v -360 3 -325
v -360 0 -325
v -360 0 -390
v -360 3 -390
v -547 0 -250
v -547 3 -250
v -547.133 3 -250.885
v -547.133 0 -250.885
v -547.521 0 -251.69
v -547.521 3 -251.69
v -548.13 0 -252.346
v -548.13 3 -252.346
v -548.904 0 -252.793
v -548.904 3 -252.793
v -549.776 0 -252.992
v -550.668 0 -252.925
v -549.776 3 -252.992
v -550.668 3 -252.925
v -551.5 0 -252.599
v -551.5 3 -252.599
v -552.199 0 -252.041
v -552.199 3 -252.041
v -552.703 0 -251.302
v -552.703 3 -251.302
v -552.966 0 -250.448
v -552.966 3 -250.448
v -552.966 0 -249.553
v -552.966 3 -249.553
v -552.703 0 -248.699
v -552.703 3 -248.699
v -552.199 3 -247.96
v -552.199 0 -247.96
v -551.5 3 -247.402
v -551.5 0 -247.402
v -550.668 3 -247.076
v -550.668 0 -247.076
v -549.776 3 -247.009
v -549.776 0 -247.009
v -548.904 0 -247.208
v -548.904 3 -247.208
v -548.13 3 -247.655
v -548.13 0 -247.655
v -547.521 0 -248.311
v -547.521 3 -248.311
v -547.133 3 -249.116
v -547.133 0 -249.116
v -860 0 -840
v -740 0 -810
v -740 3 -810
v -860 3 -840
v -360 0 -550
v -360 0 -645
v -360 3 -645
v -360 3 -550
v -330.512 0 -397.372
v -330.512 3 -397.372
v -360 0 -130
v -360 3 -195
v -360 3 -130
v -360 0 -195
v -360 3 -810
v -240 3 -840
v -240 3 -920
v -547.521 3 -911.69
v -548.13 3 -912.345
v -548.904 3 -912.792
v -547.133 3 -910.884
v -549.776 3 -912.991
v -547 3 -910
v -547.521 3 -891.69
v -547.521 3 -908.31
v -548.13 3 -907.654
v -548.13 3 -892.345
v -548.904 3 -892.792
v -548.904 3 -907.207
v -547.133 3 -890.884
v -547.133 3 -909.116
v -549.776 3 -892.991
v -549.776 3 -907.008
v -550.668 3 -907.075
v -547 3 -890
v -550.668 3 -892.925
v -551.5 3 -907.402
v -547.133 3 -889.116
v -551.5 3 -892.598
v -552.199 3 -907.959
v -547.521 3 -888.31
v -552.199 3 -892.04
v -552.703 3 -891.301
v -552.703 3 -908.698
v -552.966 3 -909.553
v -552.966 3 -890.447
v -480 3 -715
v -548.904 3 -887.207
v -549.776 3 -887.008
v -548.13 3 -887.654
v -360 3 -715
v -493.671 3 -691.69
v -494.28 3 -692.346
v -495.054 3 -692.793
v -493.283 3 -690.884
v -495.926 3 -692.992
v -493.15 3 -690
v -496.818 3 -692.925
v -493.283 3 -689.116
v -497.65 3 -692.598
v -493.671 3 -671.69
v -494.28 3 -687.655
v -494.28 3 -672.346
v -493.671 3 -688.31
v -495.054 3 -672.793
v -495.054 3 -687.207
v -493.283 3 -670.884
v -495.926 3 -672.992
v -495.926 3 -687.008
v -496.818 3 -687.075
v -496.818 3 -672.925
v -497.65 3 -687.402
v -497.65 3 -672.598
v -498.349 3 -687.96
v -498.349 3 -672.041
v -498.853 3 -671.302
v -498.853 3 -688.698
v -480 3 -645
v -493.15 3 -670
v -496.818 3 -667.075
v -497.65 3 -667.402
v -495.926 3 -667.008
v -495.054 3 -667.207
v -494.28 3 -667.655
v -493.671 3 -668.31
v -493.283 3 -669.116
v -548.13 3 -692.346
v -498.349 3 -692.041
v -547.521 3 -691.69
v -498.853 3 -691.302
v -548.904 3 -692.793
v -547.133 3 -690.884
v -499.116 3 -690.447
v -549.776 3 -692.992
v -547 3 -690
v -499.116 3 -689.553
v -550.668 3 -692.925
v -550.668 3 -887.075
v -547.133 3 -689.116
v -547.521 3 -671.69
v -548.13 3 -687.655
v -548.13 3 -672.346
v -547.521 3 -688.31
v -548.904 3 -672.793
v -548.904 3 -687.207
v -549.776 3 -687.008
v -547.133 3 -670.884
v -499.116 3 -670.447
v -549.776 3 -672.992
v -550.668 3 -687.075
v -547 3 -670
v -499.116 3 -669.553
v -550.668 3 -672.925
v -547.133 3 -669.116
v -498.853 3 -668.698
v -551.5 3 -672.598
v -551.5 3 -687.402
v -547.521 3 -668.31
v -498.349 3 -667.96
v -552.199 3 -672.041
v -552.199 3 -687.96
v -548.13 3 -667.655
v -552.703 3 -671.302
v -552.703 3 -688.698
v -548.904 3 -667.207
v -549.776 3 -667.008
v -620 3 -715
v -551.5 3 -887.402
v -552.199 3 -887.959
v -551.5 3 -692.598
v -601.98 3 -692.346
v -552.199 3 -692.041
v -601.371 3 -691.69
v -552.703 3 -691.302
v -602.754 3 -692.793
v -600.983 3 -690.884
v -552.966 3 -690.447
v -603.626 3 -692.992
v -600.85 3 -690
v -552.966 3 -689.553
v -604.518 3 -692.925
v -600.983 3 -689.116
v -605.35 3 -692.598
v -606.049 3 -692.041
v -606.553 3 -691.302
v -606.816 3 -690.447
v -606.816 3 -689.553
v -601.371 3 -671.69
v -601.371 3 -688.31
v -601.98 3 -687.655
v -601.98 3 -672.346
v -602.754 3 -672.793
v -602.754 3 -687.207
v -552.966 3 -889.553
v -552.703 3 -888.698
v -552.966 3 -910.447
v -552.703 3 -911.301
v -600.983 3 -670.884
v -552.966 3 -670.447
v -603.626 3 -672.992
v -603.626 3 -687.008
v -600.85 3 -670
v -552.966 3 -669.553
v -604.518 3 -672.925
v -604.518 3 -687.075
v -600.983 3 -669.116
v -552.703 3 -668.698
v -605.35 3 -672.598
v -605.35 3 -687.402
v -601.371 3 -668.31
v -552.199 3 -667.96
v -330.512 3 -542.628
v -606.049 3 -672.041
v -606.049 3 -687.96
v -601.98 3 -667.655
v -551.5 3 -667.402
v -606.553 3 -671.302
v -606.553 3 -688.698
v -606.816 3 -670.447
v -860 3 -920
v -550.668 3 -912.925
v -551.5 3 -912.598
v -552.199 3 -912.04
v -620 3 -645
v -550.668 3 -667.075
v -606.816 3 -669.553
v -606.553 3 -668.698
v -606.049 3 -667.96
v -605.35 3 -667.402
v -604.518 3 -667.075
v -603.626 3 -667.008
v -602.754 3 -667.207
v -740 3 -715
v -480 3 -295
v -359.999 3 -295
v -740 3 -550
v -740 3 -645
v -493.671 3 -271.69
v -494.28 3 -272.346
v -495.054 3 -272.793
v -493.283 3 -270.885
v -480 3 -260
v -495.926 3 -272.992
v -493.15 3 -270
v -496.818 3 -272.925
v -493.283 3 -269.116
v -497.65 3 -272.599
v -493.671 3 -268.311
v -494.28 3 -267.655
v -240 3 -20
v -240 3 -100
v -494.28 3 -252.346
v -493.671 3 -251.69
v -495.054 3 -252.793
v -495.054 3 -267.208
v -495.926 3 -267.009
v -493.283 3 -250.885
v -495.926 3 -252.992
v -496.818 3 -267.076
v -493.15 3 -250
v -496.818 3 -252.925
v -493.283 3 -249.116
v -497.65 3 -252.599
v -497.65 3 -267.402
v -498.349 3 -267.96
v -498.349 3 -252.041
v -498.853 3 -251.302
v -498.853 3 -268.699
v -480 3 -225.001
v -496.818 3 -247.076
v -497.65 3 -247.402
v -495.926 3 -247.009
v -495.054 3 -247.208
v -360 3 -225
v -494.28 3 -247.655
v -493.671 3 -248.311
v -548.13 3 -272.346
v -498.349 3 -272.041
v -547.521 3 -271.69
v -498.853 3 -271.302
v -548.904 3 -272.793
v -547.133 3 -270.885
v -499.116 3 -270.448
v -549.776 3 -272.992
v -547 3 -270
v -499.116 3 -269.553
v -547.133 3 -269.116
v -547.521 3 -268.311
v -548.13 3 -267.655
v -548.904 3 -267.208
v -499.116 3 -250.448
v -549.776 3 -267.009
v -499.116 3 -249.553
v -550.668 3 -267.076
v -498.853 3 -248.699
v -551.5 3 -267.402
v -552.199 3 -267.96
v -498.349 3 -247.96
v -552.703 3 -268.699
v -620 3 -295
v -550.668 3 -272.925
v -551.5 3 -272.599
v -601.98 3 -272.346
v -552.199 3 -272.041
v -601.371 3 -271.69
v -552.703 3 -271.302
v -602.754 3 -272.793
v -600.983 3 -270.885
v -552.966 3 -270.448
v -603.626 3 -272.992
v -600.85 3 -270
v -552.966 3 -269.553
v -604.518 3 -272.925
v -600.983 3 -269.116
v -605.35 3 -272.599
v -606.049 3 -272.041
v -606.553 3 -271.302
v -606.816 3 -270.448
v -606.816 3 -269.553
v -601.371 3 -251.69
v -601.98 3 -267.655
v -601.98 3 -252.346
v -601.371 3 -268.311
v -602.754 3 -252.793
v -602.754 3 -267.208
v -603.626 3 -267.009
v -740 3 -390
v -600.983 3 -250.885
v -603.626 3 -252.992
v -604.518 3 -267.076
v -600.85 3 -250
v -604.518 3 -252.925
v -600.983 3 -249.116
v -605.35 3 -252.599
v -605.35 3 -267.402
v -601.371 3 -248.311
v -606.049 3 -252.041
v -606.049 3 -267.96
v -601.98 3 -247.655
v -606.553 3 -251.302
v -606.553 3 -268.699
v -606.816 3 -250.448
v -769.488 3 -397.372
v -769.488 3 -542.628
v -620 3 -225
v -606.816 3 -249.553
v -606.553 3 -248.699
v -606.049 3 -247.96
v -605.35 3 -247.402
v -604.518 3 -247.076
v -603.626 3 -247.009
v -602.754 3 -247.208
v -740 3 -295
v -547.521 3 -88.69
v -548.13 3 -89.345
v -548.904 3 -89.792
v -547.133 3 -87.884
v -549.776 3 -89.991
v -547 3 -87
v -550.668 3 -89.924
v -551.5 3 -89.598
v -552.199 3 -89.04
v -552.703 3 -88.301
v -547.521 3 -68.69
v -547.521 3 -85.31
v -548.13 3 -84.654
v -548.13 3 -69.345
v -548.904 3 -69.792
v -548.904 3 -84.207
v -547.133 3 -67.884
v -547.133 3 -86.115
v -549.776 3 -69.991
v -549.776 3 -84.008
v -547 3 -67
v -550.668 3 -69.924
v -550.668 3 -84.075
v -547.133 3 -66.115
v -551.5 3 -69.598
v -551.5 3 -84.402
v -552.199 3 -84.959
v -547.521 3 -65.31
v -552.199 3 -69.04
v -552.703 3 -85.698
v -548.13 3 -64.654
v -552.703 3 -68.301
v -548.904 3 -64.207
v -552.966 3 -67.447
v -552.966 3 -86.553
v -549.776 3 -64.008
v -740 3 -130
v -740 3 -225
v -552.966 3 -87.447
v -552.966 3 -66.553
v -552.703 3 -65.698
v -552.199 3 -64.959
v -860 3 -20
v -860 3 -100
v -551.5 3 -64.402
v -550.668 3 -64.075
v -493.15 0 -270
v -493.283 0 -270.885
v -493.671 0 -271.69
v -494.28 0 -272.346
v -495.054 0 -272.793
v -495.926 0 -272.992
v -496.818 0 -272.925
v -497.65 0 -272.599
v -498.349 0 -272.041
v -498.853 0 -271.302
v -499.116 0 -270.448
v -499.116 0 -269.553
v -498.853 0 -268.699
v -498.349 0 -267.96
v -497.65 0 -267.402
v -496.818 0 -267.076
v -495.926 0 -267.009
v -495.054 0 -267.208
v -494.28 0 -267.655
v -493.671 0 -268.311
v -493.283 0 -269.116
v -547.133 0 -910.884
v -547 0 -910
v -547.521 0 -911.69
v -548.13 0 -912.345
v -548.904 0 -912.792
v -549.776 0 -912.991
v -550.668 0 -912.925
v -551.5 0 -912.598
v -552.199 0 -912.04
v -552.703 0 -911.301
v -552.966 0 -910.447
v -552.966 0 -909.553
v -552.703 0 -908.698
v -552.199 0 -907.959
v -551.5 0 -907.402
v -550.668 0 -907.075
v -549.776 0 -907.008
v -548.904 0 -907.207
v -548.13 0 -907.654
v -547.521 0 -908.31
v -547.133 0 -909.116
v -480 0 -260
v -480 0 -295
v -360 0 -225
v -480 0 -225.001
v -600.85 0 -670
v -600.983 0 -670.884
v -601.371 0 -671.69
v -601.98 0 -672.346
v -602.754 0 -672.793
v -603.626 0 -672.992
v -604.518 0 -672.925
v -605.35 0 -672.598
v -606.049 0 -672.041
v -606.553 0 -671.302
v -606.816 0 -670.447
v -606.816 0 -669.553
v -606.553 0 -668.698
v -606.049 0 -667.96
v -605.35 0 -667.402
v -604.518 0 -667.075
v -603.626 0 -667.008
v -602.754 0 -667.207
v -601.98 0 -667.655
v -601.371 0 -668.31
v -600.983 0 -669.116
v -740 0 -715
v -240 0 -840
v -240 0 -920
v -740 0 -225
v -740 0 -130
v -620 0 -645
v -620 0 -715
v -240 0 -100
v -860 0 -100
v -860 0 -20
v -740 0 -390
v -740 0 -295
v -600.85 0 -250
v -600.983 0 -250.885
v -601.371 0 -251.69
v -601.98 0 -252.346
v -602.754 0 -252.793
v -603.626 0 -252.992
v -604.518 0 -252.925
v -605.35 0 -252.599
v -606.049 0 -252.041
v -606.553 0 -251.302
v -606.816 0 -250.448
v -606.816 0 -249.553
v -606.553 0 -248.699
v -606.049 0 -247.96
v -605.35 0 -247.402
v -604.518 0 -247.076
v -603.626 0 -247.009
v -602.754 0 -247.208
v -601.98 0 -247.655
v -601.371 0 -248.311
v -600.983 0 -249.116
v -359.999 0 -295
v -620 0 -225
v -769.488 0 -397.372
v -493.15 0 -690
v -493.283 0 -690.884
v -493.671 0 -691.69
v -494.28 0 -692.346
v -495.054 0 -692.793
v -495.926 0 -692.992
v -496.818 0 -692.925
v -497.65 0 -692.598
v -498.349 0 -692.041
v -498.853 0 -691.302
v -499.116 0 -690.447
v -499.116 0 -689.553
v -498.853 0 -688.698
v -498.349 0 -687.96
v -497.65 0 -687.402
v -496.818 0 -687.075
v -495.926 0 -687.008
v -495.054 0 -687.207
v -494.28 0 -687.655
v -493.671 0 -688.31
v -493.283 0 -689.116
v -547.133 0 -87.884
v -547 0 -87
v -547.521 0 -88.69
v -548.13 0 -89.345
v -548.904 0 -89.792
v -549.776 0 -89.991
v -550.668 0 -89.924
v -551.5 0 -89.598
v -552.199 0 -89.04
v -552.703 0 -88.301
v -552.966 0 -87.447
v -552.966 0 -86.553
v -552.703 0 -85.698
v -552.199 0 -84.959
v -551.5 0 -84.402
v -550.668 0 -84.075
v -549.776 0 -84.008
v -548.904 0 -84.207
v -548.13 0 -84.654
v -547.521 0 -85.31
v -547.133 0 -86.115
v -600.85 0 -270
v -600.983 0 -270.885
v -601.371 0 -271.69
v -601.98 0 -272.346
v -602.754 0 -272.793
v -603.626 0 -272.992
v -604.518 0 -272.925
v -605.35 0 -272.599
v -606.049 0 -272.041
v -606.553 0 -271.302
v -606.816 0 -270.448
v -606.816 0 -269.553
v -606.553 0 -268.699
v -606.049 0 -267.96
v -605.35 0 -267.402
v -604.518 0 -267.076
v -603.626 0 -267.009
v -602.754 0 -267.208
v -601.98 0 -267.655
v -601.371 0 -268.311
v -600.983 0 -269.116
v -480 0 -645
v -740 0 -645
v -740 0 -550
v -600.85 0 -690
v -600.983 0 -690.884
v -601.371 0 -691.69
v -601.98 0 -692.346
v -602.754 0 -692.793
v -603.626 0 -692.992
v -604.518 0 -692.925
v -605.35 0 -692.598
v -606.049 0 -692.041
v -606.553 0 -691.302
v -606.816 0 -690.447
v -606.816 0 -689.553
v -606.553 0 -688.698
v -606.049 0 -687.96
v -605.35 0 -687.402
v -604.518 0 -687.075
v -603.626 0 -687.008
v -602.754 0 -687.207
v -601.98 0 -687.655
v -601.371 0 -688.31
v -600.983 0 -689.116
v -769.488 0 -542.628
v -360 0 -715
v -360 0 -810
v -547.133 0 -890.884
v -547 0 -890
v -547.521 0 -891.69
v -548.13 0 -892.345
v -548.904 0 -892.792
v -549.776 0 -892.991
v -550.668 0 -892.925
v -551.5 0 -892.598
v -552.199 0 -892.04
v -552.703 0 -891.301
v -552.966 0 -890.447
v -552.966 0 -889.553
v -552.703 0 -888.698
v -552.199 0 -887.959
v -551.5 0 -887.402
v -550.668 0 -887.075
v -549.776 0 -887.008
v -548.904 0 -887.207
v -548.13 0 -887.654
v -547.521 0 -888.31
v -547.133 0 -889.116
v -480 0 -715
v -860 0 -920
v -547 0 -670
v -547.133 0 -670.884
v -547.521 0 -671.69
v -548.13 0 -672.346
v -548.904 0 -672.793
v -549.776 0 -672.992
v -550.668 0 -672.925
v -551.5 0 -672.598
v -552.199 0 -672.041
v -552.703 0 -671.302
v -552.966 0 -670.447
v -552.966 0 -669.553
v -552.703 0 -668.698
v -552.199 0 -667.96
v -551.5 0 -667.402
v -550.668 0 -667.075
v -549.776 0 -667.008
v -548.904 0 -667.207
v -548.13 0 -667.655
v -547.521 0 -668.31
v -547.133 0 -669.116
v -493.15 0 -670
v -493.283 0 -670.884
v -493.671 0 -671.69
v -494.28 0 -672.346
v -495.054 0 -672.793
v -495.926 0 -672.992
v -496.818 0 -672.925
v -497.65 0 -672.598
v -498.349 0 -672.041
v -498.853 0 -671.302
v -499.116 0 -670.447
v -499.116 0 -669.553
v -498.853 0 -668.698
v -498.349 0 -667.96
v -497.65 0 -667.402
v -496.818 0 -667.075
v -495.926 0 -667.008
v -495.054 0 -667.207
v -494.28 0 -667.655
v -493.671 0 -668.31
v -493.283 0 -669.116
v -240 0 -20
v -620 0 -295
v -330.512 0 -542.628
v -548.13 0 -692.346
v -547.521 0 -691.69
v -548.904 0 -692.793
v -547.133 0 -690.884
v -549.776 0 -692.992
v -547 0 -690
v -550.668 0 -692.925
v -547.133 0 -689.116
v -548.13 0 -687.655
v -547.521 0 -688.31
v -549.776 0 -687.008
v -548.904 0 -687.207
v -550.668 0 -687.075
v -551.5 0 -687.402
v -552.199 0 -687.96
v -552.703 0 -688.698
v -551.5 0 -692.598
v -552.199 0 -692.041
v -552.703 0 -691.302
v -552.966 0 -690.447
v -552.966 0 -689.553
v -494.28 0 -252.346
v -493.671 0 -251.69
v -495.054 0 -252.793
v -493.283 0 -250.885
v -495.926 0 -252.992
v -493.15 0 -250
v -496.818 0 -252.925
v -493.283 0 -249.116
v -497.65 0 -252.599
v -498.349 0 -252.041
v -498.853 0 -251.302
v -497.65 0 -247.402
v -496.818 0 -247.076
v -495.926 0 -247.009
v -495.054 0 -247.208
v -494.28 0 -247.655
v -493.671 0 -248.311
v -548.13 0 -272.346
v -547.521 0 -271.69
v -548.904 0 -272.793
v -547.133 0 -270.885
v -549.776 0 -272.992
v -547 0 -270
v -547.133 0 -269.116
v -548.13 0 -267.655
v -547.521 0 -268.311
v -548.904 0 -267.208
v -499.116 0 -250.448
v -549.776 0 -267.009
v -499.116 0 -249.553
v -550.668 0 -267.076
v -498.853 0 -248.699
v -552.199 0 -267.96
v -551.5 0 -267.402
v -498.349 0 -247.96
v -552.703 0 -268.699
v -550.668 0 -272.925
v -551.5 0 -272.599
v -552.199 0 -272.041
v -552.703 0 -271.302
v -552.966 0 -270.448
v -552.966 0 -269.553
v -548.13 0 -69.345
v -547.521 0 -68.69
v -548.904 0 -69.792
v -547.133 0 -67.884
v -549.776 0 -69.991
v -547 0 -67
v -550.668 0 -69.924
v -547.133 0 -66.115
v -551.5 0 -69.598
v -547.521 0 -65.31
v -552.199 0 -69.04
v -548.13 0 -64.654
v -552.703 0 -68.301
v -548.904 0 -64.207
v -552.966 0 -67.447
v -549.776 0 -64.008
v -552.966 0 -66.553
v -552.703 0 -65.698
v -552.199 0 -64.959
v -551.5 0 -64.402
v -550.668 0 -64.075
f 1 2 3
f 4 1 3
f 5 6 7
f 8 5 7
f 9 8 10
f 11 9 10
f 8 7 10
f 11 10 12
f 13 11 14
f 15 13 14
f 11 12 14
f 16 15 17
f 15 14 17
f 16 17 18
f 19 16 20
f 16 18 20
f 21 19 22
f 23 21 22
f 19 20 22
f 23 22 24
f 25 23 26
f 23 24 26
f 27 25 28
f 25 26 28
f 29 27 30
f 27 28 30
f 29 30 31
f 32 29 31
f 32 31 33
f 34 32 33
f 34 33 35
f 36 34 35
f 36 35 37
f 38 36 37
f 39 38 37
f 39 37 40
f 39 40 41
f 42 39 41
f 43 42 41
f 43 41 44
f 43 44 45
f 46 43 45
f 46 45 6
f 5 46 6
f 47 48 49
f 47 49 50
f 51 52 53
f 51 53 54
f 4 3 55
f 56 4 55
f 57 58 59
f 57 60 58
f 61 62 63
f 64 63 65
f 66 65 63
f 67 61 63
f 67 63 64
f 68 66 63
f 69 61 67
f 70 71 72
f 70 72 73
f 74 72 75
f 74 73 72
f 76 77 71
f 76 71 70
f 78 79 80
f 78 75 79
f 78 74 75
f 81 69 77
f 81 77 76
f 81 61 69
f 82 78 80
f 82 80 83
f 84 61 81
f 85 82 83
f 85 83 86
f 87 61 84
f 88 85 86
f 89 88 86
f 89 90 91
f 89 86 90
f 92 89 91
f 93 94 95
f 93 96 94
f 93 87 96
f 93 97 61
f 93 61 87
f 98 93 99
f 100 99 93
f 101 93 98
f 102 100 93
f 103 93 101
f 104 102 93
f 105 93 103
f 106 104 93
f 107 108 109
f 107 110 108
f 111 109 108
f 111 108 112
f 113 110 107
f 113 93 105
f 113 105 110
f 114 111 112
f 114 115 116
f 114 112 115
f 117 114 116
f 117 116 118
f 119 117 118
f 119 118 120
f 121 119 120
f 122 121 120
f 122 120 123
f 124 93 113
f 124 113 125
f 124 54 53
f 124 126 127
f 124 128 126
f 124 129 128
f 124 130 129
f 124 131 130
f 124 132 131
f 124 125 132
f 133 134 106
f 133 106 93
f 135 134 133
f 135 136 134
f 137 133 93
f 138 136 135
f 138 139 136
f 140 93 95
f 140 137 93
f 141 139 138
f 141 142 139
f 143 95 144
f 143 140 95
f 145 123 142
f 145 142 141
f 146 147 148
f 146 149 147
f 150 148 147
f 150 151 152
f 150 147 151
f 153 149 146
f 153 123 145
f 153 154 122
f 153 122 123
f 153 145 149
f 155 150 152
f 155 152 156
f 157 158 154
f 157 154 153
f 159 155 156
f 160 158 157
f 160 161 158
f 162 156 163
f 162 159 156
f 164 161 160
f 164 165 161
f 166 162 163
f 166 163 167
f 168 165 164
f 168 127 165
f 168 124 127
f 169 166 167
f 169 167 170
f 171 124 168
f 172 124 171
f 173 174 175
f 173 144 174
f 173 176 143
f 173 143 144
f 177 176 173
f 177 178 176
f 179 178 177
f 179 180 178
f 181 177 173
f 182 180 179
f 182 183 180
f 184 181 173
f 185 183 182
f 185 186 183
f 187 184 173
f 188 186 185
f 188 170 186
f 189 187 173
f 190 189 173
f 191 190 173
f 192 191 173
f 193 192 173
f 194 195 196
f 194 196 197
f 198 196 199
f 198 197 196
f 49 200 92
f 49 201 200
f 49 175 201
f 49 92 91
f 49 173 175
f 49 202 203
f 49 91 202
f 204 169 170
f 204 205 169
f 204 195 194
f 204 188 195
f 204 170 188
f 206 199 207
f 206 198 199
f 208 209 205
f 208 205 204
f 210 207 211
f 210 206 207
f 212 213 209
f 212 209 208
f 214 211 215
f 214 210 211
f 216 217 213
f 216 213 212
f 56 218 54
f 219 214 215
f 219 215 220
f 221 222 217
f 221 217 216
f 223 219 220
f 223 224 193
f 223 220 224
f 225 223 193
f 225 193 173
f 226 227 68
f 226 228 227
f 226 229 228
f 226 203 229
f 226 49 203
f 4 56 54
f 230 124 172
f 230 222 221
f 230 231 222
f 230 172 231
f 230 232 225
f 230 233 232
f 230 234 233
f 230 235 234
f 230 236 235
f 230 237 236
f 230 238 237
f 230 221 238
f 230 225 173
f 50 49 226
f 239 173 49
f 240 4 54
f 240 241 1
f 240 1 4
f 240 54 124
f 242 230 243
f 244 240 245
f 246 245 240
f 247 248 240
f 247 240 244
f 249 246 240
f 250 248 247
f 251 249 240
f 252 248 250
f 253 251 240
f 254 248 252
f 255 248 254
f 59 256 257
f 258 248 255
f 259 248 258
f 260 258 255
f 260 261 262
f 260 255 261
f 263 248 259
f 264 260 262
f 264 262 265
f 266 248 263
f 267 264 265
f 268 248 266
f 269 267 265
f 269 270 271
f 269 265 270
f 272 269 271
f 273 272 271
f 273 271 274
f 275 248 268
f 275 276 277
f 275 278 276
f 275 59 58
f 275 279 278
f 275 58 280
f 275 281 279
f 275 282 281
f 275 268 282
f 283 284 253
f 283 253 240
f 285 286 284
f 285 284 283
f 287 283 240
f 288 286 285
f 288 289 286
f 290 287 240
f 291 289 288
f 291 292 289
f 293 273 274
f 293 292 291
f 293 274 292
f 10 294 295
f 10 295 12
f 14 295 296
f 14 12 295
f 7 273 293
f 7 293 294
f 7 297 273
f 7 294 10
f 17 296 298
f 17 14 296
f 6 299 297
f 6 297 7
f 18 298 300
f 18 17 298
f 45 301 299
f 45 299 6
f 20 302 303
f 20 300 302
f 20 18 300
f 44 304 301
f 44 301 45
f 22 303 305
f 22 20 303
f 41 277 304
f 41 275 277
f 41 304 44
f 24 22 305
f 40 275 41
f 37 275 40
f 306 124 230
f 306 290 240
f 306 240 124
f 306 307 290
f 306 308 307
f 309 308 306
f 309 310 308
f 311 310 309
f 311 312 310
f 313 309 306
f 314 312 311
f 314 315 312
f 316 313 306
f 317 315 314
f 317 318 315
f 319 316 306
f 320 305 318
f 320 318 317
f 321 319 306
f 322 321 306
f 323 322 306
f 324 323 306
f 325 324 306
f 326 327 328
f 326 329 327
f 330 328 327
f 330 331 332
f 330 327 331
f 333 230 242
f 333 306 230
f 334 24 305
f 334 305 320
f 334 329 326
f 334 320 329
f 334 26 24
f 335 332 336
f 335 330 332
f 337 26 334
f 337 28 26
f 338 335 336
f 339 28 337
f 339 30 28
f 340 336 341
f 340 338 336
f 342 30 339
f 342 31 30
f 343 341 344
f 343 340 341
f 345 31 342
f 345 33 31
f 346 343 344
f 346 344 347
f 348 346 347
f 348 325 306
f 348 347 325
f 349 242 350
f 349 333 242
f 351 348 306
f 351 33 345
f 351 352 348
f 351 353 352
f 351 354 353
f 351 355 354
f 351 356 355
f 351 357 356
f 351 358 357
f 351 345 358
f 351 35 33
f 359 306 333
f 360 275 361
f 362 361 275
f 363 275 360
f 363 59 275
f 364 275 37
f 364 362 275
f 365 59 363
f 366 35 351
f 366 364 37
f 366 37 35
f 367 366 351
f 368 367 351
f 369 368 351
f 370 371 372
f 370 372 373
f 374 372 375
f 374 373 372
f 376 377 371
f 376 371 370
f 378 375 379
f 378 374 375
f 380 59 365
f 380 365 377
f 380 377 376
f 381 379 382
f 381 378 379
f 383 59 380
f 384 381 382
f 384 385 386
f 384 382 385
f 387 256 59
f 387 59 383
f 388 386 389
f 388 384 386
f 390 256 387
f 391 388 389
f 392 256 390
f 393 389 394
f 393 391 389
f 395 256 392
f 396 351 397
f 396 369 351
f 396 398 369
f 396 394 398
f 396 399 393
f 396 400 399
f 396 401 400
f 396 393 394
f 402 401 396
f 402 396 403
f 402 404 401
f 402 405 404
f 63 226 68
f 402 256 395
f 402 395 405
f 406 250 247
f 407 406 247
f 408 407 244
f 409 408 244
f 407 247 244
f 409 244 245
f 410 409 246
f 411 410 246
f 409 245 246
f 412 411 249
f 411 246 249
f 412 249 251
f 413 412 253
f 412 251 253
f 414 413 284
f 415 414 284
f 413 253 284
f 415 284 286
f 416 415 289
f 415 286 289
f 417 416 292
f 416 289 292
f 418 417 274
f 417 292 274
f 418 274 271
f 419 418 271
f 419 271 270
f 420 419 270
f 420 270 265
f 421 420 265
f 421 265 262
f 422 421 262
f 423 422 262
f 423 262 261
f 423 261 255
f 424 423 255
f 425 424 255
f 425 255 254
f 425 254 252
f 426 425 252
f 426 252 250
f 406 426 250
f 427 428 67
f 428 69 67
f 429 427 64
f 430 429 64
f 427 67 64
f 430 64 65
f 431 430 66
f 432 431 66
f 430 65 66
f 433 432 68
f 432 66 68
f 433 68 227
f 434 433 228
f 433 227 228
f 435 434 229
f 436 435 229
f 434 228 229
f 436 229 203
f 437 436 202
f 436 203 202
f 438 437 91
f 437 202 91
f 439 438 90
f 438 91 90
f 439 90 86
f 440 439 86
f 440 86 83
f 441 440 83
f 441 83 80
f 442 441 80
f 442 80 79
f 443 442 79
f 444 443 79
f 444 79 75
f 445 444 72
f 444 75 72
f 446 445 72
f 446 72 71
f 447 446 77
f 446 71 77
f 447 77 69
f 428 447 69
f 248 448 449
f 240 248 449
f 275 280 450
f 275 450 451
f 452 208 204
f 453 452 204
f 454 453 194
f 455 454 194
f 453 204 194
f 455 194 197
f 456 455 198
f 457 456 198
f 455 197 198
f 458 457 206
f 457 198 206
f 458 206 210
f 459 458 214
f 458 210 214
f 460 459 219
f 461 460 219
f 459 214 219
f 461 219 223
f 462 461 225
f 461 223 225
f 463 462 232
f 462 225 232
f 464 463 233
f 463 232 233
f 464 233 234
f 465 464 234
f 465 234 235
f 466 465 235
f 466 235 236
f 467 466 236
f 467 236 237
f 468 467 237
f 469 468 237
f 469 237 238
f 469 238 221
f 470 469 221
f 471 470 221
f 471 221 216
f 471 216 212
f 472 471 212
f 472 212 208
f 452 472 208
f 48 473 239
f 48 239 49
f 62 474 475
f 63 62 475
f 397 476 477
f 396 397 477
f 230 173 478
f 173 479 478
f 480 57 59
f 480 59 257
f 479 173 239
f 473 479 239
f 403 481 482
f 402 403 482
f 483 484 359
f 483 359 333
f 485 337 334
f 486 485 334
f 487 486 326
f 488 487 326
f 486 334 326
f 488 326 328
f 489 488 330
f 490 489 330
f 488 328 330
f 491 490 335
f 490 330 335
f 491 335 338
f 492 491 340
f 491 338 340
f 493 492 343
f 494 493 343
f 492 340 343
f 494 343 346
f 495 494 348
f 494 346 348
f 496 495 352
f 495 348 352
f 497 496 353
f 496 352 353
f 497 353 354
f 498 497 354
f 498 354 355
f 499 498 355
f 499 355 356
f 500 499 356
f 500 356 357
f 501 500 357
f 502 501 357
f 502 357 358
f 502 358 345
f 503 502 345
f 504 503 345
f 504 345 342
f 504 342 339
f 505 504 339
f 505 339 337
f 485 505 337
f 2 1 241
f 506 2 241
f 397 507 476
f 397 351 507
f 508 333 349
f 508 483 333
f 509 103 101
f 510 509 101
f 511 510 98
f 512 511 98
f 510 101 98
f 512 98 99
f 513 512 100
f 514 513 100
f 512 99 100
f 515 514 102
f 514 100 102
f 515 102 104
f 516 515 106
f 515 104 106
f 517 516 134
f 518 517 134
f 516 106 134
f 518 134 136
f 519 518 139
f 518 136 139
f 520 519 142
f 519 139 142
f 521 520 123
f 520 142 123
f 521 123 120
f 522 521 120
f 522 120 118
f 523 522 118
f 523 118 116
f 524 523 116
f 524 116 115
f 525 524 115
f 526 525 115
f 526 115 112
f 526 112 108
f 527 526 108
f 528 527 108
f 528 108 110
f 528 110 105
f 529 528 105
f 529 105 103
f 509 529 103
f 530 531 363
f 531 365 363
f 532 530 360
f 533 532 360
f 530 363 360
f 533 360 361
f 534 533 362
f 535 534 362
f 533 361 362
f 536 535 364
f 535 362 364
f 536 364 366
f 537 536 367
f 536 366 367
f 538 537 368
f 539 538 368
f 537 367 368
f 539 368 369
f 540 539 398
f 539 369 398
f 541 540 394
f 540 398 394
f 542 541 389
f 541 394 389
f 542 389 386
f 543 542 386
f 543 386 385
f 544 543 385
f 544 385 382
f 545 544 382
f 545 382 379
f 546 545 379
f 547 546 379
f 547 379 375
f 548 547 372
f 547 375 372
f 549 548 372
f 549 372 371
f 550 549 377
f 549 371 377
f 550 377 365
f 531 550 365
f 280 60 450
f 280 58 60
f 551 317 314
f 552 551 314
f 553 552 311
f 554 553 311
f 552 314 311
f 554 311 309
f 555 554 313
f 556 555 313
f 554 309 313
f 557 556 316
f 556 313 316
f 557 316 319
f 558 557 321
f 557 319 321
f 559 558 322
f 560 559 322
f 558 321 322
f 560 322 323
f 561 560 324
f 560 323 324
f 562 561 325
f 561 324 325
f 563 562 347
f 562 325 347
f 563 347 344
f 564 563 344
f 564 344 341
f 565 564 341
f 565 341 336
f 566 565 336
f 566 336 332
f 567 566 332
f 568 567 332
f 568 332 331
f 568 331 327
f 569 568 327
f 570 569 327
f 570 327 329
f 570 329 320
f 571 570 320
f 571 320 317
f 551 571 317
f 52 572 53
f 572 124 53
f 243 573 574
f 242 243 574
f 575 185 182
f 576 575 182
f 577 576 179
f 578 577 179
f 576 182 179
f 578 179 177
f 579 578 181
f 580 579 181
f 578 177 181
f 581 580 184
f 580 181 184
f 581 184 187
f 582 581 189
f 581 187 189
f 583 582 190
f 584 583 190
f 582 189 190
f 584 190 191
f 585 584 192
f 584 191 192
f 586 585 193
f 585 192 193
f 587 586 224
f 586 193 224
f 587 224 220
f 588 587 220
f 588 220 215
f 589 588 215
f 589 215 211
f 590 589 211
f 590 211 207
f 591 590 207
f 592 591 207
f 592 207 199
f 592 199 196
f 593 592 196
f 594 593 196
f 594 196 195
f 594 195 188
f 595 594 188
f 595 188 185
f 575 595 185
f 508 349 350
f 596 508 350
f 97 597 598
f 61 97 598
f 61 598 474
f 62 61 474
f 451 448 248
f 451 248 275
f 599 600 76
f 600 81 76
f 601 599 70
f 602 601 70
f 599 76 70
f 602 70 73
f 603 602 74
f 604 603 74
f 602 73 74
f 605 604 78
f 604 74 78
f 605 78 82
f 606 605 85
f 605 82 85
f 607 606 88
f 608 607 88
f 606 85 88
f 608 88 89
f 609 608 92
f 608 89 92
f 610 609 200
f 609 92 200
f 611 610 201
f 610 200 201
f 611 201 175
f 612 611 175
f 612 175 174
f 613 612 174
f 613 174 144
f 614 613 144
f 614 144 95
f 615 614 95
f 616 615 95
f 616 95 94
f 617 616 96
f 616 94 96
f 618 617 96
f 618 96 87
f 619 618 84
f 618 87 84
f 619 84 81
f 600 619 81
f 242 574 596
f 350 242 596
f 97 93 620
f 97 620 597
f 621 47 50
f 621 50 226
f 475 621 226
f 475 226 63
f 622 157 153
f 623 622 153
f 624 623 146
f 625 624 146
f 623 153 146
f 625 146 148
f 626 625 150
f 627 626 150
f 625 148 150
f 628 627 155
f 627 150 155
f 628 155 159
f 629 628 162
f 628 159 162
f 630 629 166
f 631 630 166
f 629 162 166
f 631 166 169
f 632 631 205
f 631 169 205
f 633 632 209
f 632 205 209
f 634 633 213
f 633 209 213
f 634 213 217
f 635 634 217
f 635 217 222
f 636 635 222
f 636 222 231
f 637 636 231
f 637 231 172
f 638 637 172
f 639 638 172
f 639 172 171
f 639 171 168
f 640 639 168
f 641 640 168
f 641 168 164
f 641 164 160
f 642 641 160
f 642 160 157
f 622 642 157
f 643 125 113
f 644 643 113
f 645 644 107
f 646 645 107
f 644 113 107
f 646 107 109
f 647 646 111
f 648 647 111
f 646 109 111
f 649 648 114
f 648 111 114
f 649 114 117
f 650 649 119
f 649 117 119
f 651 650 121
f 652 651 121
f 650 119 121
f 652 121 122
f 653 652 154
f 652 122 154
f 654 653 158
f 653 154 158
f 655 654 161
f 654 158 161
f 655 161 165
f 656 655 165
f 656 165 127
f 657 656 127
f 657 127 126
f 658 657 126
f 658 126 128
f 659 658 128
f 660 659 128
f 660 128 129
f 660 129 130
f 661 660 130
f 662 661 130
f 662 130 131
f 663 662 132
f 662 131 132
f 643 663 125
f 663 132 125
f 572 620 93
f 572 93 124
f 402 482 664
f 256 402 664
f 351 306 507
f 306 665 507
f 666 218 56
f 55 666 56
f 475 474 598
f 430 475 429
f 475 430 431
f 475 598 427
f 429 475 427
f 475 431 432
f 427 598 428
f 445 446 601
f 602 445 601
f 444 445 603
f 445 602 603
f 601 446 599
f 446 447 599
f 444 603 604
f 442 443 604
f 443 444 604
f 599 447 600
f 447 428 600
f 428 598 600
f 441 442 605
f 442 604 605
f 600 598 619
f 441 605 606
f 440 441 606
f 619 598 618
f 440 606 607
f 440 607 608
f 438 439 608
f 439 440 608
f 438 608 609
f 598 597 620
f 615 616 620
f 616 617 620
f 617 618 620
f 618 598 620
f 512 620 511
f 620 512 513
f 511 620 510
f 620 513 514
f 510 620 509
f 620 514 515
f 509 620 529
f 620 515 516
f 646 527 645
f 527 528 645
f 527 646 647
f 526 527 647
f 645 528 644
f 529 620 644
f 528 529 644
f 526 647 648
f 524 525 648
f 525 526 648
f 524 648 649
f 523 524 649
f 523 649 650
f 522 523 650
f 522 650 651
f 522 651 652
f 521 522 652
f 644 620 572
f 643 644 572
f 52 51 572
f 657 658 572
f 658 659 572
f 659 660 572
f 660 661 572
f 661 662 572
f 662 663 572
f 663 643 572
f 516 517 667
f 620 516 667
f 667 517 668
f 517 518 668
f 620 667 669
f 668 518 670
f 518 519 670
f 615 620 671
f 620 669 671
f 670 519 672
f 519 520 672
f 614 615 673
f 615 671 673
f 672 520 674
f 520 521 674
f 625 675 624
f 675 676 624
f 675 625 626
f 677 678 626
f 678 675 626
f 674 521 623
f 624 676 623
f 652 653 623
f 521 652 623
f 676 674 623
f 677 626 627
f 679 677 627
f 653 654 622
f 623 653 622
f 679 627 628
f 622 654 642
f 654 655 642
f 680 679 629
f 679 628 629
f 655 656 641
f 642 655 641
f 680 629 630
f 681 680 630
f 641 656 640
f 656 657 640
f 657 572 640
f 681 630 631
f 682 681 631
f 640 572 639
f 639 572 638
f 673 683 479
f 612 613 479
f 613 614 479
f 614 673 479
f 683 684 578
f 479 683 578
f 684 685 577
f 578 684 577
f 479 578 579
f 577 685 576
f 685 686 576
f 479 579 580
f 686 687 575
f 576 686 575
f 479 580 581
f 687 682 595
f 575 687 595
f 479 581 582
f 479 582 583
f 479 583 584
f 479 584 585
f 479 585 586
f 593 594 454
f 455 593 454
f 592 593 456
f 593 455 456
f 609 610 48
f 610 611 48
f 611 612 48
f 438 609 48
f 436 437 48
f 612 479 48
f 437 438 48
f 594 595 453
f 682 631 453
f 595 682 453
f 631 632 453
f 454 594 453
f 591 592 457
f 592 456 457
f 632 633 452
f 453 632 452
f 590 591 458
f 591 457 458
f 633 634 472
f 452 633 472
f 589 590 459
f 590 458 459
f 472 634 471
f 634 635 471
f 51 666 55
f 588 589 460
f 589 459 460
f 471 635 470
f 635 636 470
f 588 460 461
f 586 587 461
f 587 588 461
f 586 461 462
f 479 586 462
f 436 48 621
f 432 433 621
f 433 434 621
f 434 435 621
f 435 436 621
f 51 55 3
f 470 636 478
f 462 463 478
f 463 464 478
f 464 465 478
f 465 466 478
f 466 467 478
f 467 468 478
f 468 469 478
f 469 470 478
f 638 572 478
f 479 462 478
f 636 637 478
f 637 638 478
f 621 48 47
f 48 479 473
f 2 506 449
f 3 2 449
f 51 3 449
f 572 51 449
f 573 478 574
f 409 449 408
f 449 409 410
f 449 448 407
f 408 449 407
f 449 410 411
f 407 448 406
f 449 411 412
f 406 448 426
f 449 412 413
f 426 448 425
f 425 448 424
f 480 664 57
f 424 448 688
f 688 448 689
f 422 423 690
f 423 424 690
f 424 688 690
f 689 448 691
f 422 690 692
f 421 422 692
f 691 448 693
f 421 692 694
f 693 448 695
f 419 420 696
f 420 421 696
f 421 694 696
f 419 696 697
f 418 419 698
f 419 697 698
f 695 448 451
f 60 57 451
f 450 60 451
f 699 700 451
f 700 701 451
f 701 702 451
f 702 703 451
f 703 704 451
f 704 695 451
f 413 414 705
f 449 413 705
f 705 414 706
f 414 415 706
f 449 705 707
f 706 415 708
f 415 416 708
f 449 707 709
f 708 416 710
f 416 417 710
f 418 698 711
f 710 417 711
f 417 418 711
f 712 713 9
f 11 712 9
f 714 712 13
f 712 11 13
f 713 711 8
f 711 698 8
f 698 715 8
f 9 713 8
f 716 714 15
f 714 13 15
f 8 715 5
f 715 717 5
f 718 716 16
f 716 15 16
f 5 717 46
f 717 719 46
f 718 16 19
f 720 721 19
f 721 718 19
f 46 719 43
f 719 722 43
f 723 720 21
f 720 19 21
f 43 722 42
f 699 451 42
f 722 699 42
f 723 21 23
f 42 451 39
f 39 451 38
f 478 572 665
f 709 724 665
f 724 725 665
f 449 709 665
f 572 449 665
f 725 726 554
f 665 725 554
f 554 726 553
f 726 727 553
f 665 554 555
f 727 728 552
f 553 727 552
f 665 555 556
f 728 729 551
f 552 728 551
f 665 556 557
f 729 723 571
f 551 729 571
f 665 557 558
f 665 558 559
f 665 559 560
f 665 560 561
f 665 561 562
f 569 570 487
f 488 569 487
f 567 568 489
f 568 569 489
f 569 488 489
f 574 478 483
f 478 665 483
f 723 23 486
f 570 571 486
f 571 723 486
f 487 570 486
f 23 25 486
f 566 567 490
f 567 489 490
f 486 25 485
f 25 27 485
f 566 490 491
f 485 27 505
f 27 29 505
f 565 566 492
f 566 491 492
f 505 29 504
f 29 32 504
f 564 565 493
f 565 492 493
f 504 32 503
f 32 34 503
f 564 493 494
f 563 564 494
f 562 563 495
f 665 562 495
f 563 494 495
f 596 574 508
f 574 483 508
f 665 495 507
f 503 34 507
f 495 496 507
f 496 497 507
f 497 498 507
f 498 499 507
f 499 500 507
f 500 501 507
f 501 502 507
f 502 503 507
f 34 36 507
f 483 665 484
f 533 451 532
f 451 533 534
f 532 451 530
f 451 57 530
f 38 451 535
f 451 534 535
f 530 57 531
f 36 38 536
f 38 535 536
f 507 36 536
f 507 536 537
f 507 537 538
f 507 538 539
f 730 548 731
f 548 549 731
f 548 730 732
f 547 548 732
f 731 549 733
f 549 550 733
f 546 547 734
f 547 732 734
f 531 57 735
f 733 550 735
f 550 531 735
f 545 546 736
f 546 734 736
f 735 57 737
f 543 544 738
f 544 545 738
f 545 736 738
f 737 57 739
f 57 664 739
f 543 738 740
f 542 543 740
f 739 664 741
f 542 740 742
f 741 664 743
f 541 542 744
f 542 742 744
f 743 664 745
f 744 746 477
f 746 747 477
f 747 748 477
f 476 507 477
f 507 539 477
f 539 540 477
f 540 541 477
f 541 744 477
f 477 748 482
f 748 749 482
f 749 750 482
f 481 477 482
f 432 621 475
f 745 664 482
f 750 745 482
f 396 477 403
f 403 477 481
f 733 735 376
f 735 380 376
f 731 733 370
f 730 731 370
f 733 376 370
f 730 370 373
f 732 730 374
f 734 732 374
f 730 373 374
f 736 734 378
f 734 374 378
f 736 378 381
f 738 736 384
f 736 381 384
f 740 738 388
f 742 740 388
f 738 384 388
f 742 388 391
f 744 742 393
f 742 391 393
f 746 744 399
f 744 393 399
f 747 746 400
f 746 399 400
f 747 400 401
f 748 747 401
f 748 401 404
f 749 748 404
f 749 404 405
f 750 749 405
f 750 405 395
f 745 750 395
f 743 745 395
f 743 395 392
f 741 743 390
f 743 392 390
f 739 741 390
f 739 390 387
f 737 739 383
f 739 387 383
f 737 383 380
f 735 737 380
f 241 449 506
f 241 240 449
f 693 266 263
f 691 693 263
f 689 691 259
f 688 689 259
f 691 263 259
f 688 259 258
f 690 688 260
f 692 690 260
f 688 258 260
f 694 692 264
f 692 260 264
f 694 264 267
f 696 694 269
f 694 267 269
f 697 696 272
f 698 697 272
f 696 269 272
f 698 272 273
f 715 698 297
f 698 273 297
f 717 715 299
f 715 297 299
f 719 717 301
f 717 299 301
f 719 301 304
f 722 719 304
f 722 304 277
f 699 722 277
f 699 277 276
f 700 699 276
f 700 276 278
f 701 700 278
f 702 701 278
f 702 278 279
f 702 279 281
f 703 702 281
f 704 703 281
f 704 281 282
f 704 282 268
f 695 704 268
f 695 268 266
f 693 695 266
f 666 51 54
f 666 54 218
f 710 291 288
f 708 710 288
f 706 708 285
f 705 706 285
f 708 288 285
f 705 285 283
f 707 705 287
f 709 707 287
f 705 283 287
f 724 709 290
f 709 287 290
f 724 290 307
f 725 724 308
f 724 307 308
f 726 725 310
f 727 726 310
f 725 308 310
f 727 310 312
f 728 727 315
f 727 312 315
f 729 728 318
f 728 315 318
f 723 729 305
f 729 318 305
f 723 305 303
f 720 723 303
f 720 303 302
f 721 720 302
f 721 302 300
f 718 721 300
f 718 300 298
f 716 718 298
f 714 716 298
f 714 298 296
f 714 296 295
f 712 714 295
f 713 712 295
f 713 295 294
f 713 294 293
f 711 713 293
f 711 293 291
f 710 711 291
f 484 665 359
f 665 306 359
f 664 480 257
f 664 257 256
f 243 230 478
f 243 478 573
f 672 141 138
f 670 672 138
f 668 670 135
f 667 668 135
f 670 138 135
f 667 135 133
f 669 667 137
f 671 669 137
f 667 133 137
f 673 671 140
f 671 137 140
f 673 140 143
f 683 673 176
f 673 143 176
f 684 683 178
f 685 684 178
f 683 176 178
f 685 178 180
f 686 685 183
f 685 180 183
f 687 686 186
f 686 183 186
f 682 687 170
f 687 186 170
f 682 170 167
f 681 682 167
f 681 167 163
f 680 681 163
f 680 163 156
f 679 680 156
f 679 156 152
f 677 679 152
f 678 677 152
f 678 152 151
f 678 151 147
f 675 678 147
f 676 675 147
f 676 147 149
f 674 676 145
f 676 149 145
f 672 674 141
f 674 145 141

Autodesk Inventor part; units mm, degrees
ref_plane "YZ Plane" through (0, 0, 0) normal (1, 0, 0) x (0, 1, 0)
ref_plane "XZ Plane" through (0, 0, 0) normal (0, 1, 0) x (-1, 0, 0)
ref_plane "XY Plane" through (0, 0, 0) normal (0, 0, 1) x (1, 0, 0)
sketch "Sketch1" plane through (0, 0, 0) normal (0, 1, 0) x (-1, 0, 0)
  line L0 (359.9997, -324.9998) -> (359.9997, -389.9998)
  line L1 (359.9997, -389.9998) -> (239.9998, -420.0002)
  line L2 (359.9997, -194.9998) -> (359.9997, -129.9998)
  line L3 (359.9997, -129.9998) -> (239.9997, -99.9998)
  line L4 (359.9998, -615.0001) -> (359.9998, -550.0001)
  line L5 (359.9998, -550.0001) -> (239.9998, -520.0001)
  line L6 (359.9998, -745.0001) -> (359.9998, -810.0001)
  line L7 (359.9998, -810.0001) -> (239.9998, -840.0001)
  line L8 (740, -325.0005) -> (740, -390.0005)
  line L9 (740, -390.0005) -> (860, -420.0005)
  line L10 (740, -195.0005) -> (740, -130.0005)
  line L11 (740, -130.0005) -> (860, -100.0005)
  line L12 (740, -615.0001) -> (740, -550.0005)
  line L13 (740, -550.0005) -> (860, -520.0005)
  line L14 (740, -744.9998) -> (740, -809.9998)
  line L15 (740, -809.9998) -> (860, -839.9998)
  line L16 (860, -100.0005) -> (860, -19.9997)
  line L17 (860, -839.9998) -> (860, -919.9998)
  line L18 (239.9997, -99.9998) -> (239.9997, -19.9997)
  line L19 (239.9998, -840.0001) -> (239.9998, -920.0001)
  line L20 (859.9998, -19.9997) -> (379.9998, -19.9997)
  line L21 (860, -19.9997) -> (379.9998, -19.9997)
  line L22 (479.9997, -19.9997) -> (239.9997, -19.9997)
  line L23 (860, -919.9998) -> (139.9998, -919.9998)
  line L24 (239.9997, -19.9997) -> (859.9998, -19.9997)
  line L25 (860, -520.0005) -> (860, -420.0005)
  line L26 (239.9998, -520.0001) -> (239.9998, -420.0002)
  line L27 (479.9998, -744.9997) -> (479.9998, -745.0001)
  line L28 (479.9998, -745.0001) -> (479.9998, -615.0001)
  line L29 (479.9998, -615.0001) -> (359.9998, -615.0001)
  line L30 (479.9998, -745.0001) -> (359.9998, -745.0001)
  line L31 (620, -679.9998) -> (620, -745.0001)
  line L32 (620, -745.0001) -> (740, -744.9998)
  line L33 (620, -679.9998) -> (620, -615.0001)
  line L34 (740, -615.0001) -> (620, -615.0001)
  line L35 (620, -260.0005) -> (620, -325.0005)
  line L36 (620, -325.0005) -> (620, -195.0005)
  line L37 (620, -195.0005) -> (740, -195.0005)
  line L38 (620, -325.0005) -> (740, -325.0005)
  line L39 (479.9997, -260.0005) -> (479.9993, -325.0005)
  line L40 (479.9993, -325.0005) -> (359.9997, -324.9998)
  line L41 (479.9997, -260.0005) -> (479.9997, -195.0005)
  line L42 (479.9997, -195.0005) -> (359.9997, -194.9998)
  point P0 (479.9997, -19.9997)
  point P1 (740, -810.0001)
  point P2 (740, -550.0001)
  point P3 (740, -390.0001)
  point P4 (740, -130.0001)
  point P5 (239.9998, -919.9998)
  point P6 (239.9998, -919.9998)
  dimension "d44" = 0.45
  dimension "d16" = 80
  dimension "d23" = 65
extrude "Extrusion1" add sketch "Sketch1" along normal blind 3
sketch "Sketch2" plane through (0, 3, 0) normal (0, 1, 0) x (1, 0, 0)
  line L0 (-620, 325.0005) -> (-620, 195.0005) projected
  line L1 (-620, 260.0005) -> (-620, 225.0005)
  line L2 (-620, 225.0005) -> (-740, 225.0005)
  line L3 (-740, 195.0005) -> (-740, 130.0005) projected
  line L4 (-740, 225.0005) -> (-740, 195.0005)
  line L5 (-620, 260.0005) -> (-620, 295.0005)
  line L6 (-620, 295.0005) -> (-740, 295.0005)
  line L7 (-740, 295.0005) -> (-740, 325.0005)
  line L8 (-740, 325.0005) -> (-620, 325.0005) projected
  line L9 (-740, 325.0005) -> (-620, 325.0005)
  line L10 (-620, 325.0005) -> (-620, 295.0005)
  line L11 (-620, 225.0005) -> (-620, 195.0005)
  line L12 (-620, 195.0005) -> (-740, 195.0005)
  line L13 (-479.9997, 195.0005) -> (-479.9997, 260.0005) projected
  line L14 (-359.9997, 194.9998) -> (-479.9997, 195.0005) projected
  line L15 (-479.9997, 195.0005) -> (-359.9997, 194.9998)
  line L16 (-359.9997, 194.9998) -> (-359.9995, 225.0005)
  line L17 (-359.9995, 225.0005) -> (-479.9995, 225.0012)
  line L18 (-479.9995, 225.0012) -> (-479.9995, 295.0005)
  line L19 (-479.9997, 260.0005) -> (-479.9993, 325.0005) projected
  line L20 (-479.9993, 325.0005) -> (-359.9997, 324.9998) projected
  line L21 (-479.9993, 325.0005) -> (-359.9997, 324.9998)
  line L22 (-359.9997, 324.9998) -> (-359.9991, 295.0005)
  line L23 (-479.9995, 295.0005) -> (-359.9991, 295.0005)
  line L24 (-620, 745.0001) -> (-620, 615.0001) projected
  line L25 (-620, 680.0001) -> (-620, 645.0001)
  line L26 (-620, 645.0001) -> (-740, 645.0001)
  line L27 (-740, 645.0001) -> (-740, 615.0001)
  line L28 (-740, 615.0001) -> (-620, 615.0001)
  line L29 (-620, 615.0001) -> (-620, 645.0001)
  line L30 (-620, 680.0001) -> (-620, 715.0001)
  line L31 (-620, 715.0001) -> (-740, 715.0001)
  line L32 (-740, 744.9998) -> (-620, 745.0001) projected
  line L33 (-740, 715.0001) -> (-740, 744.9998)
  line L34 (-740, 744.9998) -> (-620, 745.0001)
  line L35 (-620, 745.0001) -> (-620, 715.0001)
  line L36 (-479.9998, 615.0001) -> (-479.9998, 745.0001) projected
  line L37 (-479.9998, 680.0001) -> (-479.9998, 645.0001)
  line L38 (-479.9998, 645.0001) -> (-359.9998, 645.0001)
  line L39 (-359.9998, 615.0001) -> (-479.9998, 615.0001) projected
  line L40 (-359.9998, 645.0001) -> (-359.9998, 615.0001)
  line L41 (-359.9998, 615.0001) -> (-479.9998, 615.0001)
  line L42 (-479.9998, 615.0001) -> (-479.9998, 645.0001)
  line L43 (-479.9998, 680.0001) -> (-479.9998, 715.0001)
  line L44 (-479.9998, 715.0001) -> (-359.9998, 715.0001)
  line L45 (-479.9998, 745.0001) -> (-359.9998, 745.0001) projected
  line L46 (-359.9998, 715.0001) -> (-359.9998, 745.0001)
  line L47 (-359.9998, 745.0001) -> (-479.9998, 745.0001)
  line L48 (-479.9998, 745.0001) -> (-479.9998, 715.0001)
  point P0 (0, 0)
  dimension "d26" = 35
  dimension "d27" = 35
  dimension "d28" = 35
  dimension "d29" = 35
  dimension "d30" = 35
  dimension "d31" = 35
extrude "Extrusion2" add sketch "Sketch2" against normal up to surface (3 mm away)
sketch "Sketch3" plane through (0, 3, 0) normal (0, 1, 0) x (1, 0, 0)
  line L0 (-620, 295.0005) -> (-620, 225.0005) projected
  line L1 (-620, 260.0005) -> (-620, 240.0005)
  line L2 (-620, 240.0005) -> (-479.9995, 240.0005)
  line L3 (-479.9995, 225.0012) -> (-479.9995, 295.0005) projected
  line L4 (-479.9995, 240.0005) -> (-479.9995, 280.0005)
  line L5 (-479.9995, 280.0005) -> (-620, 280.0005)
  line L6 (-620, 280.0005) -> (-620, 260.0005)
  line L7 (-620, 715.0001) -> (-620, 645.0001) projected
  line L8 (-620, 680.0001) -> (-620, 660.0001)
  line L9 (-620, 660.0001) -> (-479.9998, 660.0001)
  line L10 (-479.9998, 645.0001) -> (-479.9998, 715.0001) projected
  line L11 (-479.9998, 660.0001) -> (-479.9998, 680.0001)
  line L12 (-479.9998, 680.0001) -> (-479.9998, 700.0001)
  line L13 (-479.9998, 700.0001) -> (-620, 700.0001)
  line L14 (-620, 700.0001) -> (-620, 680.0001)
  point P0 (0, 0)
  dimension "d34" = 20
  dimension "d35" = 40
  dimension "d36" = 20
  dimension "d37" = 20
  dimension "d38" = 20
sketch "Sketch4" plane through (0, 3, 0) normal (0, 1, 0) x (1, 0, 0)
  line L0 (-860, 520.0005) -> (-860, 420.0005) projected
  line L1 (-860, 470.0005) -> (-828.2194, 470.0005)
  line L2 (-239.9998, 420.0002) -> (-239.9998, 520.0001) projected
  line L3 (-860, 19.9997) -> (-239.9997, 19.9997) projected
  line L4 (-549.9999, 19.9997) -> (-549.9999, 470.0003)
  line L5 (-549.9999, 470.0003) -> (-549.5499, 470.0003)
  line L6 (-549.9999, 470.0003) -> (-550.4499, 470.0003)
  circle A0 centre (-549.5499, 470.0003) radius 73.409
  point P0 (0, 0)
  dimension "d44" = 0.45
sketch "Sketch7" plane through (0, 3, 0) normal (0, 1, 0) x (1, 0, 0)
  circle A0 centre (-550, 66.9997) radius 3.05
  circle A1 centre (-550, 250.0005) radius 5 projected
  circle A2 centre (-603.85, 270.0005) radius 4.6 projected
  circle A3 centre (-603.85, 250.0005) radius 4.6 projected
  circle A4 centre (-496.15, 250.0005) radius 5 projected
  circle A5 centre (-496.15, 270.0005) radius 5 projected
  line L0 (-537.75, 919.9998) -> (-562.25, 919.9998) projected
  line L1 (-537.75, 879.9998) -> (-537.75, 919.9998) projected
  line L2 (-562.25, 879.9998) -> (-537.75, 879.9998) projected
  line L3 (-562.25, 879.9998) -> (-562.25, 919.9998) projected
  circle A6 centre (-603.85, 690.0001) radius 4.6 projected
  circle A7 centre (-603.85, 670.0001) radius 4.6 projected
  circle A8 centre (-550, 690.0001) radius 4.6 projected
  circle A9 centre (-550, 670.0001) radius 4.6 projected
  circle A10 centre (-496.15, 690.0001) radius 4.6 projected
  circle A11 centre (-496.15, 670.0001) radius 4.6 projected
  circle A12 centre (-550, 66.9997) radius 3
  circle A13 centre (-550, 86.9997) radius 3
  circle A14 centre (-496.15, 250.0005) radius 3
  circle A15 centre (-496.15, 270.0005) radius 3
  circle A16 centre (-550, 250.0005) radius 3
  circle A17 centre (-550, 270.0005) radius 3
  circle A18 centre (-603.85, 250.0005) radius 3
  circle A19 centre (-603.85, 270.0005) radius 3
  circle A20 centre (-496.15, 670.0001) radius 3
  circle A21 centre (-496.15, 690.0001) radius 3
  circle A22 centre (-550, 670.0001) radius 3
  circle A23 centre (-550, 690.0001) radius 3
  circle A24 centre (-603.85, 670.0001) radius 3
  circle A25 centre (-603.85, 690.0001) radius 3
  circle A26 centre (-550, 889.9998) radius 3
  circle A27 centre (-550, 909.9998) radius 3
  point P0 (0, 0)
  dimension "d53" = 6
  dimension "d54" = 6
  dimension "d55" = 6
  dimension "d56" = 6
  dimension "d57" = 6
  dimension "d58" = 6
  dimension "d59" = 6
  dimension "d60" = 6
  dimension "d61" = 6
  dimension "d62" = 6
  dimension "d63" = 6
  dimension "d64" = 6
  dimension "d65" = 6
  dimension "d66" = 6
  dimension "d67" = 6
  dimension "d68" = 6
extrude "Extrusion7" cut sketch "Sketch7" against normal up to surface (3 mm away) contours A12 | A13 | A14 | A15 | A16 | A17 | A18 | A19 | A20 | A21 | A22 | A23 | A24 | A25 | A26 | A27
sketch "Sketch8" plane through (0, 3, 0) normal (0, 1, 0) x (1, 0, 0)
  line L0 (-239.9998, 420.0002) -> (-239.9998, 520.0001) projected
  line L1 (-860, 520.0005) -> (-860, 420.0005) projected
  line L2 (-769.488, 470.0005) -> (-769.488, 542.6285)
  line L3 (-740, 550.0005) -> (-860, 520.0005) projected
  line L4 (-769.488, 470.0005) -> (-769.488, 397.3725)
  line L5 (-860, 420.0005) -> (-740, 390.0005) projected
  line L6 (-330.5118, 470.0001) -> (-330.5118, 542.6281)
  line L7 (-239.9998, 520.0001) -> (-359.9998, 550.0001) projected
  line L8 (-330.5118, 470.0001) -> (-330.5118, 397.3719)
  line L9 (-359.9997, 389.9998) -> (-239.9998, 420.0002) projected
  point P0 (0, 0)
extrude "Extrusion8" cut sketch "Sketch8" against normal up to surface (3 mm away)
properties part number "base"
